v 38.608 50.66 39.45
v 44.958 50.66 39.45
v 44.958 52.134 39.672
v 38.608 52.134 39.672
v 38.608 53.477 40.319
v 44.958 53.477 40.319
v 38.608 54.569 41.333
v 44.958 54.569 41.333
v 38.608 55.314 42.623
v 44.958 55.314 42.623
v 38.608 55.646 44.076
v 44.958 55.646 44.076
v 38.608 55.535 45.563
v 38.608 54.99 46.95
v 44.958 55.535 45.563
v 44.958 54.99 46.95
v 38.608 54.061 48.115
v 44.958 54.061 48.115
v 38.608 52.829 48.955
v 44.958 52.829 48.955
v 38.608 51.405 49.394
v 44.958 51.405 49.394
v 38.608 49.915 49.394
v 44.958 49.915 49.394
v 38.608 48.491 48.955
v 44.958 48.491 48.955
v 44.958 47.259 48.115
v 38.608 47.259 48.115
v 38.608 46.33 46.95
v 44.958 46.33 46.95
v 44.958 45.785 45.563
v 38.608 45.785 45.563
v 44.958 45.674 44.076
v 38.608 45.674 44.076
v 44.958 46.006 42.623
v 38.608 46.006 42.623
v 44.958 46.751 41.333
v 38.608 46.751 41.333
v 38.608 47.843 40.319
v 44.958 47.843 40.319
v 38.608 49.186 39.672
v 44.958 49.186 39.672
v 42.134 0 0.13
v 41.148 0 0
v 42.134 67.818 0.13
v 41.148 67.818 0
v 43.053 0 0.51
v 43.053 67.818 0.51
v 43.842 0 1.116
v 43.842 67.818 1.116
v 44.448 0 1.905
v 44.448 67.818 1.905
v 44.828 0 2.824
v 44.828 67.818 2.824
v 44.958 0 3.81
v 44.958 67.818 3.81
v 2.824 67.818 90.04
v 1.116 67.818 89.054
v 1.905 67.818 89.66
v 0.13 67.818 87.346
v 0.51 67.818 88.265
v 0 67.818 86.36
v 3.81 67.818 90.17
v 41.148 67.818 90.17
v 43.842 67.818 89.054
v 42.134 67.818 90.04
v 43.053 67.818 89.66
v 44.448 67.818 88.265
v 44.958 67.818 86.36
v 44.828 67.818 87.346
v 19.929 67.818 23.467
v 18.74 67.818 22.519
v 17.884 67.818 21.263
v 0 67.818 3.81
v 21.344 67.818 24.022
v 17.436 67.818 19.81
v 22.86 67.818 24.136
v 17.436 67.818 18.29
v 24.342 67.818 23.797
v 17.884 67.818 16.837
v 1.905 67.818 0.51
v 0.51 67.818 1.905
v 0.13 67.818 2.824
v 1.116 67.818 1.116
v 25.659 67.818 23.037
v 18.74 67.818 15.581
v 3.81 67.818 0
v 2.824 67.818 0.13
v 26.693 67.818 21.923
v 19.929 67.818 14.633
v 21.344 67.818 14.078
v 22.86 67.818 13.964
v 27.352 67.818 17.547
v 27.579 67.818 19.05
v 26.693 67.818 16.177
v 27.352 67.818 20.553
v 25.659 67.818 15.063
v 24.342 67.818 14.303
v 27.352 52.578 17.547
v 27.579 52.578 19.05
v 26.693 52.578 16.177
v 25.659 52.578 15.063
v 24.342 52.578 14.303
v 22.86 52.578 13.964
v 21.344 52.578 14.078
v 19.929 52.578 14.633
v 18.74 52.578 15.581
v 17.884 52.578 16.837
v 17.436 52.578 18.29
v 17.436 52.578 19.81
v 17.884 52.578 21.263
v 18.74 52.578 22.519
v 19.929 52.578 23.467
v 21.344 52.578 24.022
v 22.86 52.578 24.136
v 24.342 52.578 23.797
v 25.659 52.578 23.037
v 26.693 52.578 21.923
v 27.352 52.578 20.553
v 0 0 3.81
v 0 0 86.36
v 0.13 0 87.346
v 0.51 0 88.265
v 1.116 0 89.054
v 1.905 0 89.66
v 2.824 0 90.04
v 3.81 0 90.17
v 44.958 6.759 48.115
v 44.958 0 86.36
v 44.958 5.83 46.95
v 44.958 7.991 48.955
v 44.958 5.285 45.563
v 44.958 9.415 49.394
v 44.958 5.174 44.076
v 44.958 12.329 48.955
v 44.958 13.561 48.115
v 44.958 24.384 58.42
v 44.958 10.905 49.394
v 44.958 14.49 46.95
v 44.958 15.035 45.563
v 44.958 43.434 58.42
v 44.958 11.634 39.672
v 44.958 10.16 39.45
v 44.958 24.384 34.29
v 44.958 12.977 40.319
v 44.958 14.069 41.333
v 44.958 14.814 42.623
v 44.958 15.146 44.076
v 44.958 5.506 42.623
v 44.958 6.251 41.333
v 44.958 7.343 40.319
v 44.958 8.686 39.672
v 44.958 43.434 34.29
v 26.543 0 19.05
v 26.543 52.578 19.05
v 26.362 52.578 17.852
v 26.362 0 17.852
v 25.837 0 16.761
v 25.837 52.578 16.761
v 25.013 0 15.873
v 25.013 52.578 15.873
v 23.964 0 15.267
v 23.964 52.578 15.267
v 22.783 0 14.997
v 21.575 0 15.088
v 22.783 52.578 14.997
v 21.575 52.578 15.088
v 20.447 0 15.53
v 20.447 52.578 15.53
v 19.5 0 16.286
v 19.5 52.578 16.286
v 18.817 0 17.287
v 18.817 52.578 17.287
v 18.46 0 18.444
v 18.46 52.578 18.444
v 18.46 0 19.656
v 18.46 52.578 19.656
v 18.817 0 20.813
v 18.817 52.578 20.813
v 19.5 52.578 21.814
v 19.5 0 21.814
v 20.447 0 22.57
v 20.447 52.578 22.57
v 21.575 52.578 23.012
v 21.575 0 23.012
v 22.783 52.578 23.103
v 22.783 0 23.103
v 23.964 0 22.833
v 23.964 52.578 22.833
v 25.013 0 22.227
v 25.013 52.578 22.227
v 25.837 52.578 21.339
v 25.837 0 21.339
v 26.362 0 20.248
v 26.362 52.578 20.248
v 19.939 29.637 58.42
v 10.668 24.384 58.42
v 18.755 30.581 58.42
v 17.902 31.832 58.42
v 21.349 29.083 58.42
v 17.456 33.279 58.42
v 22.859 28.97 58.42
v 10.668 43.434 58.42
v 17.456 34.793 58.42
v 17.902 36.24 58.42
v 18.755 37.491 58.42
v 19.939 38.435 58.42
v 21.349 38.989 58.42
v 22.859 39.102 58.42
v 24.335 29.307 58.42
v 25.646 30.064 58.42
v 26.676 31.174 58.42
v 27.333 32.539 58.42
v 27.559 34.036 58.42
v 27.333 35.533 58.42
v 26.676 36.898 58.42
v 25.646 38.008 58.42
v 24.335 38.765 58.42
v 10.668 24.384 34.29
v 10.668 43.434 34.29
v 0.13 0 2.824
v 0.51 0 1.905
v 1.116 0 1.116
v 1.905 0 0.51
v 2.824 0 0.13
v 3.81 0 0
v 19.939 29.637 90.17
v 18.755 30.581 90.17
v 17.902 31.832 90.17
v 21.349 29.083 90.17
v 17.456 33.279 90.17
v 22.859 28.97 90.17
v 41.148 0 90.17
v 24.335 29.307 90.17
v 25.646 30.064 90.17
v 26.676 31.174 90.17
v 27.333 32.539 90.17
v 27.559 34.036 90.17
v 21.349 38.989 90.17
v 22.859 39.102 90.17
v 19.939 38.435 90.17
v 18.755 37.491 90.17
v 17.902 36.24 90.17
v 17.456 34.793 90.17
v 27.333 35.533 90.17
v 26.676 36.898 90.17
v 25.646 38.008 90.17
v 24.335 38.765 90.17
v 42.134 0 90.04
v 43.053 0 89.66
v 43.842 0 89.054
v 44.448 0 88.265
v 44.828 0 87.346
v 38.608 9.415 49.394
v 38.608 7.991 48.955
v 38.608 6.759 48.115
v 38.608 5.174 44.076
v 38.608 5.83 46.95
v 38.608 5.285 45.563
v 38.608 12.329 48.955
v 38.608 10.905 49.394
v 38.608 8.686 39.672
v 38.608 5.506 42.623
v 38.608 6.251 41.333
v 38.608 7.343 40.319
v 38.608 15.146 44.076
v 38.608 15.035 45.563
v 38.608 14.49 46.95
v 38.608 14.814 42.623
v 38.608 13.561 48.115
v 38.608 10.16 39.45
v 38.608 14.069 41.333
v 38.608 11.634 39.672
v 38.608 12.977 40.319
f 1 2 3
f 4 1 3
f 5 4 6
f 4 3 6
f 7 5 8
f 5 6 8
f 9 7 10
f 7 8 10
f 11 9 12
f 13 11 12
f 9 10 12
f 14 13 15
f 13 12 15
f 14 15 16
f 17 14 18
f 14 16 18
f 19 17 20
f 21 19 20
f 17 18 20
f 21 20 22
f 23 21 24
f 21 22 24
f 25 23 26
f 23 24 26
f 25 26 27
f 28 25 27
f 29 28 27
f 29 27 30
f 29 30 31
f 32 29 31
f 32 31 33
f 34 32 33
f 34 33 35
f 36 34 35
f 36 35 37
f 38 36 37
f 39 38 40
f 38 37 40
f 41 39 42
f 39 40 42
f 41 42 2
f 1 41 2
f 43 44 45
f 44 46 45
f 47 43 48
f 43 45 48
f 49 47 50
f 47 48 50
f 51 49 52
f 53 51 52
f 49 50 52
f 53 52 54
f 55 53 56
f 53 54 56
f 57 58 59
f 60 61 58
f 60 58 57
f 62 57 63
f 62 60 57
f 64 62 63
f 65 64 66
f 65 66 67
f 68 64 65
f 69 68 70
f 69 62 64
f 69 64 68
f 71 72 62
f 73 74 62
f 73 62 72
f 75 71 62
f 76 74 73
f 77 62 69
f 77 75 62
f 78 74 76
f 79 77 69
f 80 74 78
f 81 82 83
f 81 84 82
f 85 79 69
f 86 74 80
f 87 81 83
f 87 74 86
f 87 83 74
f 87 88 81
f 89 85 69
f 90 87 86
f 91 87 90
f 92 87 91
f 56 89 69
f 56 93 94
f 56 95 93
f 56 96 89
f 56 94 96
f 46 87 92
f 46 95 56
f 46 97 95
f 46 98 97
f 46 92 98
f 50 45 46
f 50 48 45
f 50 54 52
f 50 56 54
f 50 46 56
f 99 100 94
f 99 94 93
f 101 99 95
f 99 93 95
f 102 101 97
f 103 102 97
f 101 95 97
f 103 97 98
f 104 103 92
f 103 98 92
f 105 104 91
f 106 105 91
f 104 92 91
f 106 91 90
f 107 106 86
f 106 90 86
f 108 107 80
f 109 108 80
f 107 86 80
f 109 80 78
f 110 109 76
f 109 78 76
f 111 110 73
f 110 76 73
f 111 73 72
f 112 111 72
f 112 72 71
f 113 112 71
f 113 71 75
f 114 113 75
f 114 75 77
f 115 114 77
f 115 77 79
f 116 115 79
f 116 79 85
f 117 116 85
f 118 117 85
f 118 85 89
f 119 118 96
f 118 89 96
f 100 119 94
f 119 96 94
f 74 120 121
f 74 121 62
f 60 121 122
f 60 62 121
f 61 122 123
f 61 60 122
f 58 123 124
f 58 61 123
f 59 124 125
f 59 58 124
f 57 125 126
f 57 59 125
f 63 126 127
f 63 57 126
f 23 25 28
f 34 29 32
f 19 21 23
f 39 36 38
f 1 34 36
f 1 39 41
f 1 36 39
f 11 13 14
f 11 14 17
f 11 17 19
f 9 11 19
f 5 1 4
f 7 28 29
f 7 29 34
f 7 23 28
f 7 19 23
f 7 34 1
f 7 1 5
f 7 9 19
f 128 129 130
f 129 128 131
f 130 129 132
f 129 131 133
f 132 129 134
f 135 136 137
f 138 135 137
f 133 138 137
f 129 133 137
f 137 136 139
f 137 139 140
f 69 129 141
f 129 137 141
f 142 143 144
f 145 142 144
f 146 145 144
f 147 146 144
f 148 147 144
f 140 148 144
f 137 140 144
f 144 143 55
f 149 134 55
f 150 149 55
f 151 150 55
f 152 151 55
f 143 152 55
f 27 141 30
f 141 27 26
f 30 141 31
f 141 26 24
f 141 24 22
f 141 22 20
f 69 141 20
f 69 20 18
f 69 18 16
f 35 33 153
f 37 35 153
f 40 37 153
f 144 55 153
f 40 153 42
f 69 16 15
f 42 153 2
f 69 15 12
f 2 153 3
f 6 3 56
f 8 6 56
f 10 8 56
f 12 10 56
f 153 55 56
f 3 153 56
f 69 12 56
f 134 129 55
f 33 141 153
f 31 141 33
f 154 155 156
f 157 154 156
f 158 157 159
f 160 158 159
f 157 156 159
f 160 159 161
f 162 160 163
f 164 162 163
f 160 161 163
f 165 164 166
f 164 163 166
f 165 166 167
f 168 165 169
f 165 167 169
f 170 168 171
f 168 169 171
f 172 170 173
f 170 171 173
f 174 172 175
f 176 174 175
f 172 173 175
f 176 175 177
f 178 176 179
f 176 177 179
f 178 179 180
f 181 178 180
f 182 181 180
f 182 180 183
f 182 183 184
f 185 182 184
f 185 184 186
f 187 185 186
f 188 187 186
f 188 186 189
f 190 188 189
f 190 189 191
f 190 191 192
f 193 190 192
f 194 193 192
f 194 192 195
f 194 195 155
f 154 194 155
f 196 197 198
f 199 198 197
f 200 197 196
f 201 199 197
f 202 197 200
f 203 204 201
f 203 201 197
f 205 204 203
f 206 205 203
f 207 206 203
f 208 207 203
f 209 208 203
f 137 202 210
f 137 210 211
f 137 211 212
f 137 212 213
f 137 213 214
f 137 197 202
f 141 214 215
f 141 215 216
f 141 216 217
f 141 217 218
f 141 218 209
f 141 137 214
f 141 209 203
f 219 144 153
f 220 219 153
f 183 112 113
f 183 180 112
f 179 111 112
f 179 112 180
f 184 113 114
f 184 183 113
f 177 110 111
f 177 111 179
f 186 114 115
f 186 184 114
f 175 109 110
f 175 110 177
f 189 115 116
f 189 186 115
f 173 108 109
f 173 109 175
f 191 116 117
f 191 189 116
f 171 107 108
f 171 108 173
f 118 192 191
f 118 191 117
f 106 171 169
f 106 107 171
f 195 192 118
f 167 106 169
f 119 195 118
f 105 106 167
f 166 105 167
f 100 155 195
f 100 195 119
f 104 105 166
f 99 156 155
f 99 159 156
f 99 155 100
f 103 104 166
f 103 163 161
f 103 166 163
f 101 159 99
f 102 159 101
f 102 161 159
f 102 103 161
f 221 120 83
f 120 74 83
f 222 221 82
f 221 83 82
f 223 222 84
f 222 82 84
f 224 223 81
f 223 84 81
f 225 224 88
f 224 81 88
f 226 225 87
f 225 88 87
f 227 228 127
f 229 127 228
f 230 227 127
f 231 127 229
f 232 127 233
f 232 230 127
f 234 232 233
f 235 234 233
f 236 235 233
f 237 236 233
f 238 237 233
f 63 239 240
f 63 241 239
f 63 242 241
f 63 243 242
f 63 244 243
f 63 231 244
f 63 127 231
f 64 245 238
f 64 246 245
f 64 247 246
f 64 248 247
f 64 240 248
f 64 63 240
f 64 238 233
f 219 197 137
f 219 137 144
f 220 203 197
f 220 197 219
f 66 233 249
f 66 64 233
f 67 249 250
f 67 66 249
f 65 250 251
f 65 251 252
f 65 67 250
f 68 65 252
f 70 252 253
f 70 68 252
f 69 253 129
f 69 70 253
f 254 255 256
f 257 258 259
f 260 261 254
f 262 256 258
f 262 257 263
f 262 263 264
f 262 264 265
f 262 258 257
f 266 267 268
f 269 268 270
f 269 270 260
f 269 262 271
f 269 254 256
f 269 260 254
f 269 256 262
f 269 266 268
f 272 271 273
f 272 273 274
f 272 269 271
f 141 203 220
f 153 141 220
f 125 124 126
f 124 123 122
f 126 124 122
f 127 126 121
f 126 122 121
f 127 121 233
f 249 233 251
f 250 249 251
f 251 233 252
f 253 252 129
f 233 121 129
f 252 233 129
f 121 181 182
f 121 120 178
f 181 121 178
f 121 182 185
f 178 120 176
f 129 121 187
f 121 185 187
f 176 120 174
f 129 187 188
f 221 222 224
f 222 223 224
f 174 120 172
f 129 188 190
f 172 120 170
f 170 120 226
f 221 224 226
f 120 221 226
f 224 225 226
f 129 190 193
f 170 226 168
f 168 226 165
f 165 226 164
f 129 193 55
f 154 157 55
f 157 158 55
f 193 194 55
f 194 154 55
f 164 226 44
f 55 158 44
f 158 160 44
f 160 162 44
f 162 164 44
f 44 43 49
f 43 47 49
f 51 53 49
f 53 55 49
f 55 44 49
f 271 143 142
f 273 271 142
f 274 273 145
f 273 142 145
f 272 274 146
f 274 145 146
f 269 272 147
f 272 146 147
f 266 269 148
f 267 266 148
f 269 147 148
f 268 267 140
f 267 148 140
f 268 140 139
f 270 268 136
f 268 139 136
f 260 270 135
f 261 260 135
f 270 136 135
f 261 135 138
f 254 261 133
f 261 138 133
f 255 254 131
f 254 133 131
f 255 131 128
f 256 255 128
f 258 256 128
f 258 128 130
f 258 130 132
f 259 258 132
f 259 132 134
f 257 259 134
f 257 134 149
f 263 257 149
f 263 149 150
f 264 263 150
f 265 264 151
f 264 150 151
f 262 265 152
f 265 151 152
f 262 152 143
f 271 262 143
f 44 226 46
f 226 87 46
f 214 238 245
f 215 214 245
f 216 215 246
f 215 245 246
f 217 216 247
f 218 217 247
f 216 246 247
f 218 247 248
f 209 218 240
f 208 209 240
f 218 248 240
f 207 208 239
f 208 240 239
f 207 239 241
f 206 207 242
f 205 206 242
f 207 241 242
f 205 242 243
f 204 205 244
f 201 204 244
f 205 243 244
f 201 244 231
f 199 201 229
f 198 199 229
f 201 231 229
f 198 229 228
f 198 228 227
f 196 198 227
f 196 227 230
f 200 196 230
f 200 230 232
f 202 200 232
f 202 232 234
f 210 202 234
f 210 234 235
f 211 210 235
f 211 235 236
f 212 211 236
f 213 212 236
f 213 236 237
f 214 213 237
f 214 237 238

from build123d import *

# Parameters (mm, degrees)
SKETCH1_W           = 44.958
SKETCH1_H           = 67.818
BOSS_EXTRUDE1_DEPTH = 90.17
SKETCH2_R           = 5
CUT_EXTRUDE1_DEPTH  = 6.35
SKETCH3_R           = 4.064
CUT_EXTRUDE2_DEPTH  = 68.818
SKETCH4_R           = 5.1
CUT_EXTRUDE3_DEPTH  = 15.24
SKETCH5_R           = 5.08
CUT_EXTRUDE4_DEPTH  = 50.8
SKETCH6_W           = 24.13
SKETCH6_H           = 19.05
CUT_EXTRUDE5_DEPTH  = 34.29
FILLET1_R           = 3.81


with BuildPart() as part:
    # Sketch1 → Boss-Extrude1 (new body)
    with BuildSketch(Plane.XY):
        with Locations((22.479, 33.909)):
            Rectangle(SKETCH1_W, SKETCH1_H)
    extrude(amount=BOSS_EXTRUDE1_DEPTH)

    # Sketch2 → Cut-Extrude1 (cut)
    with BuildSketch(Plane(origin=(44.958, 0, 0), x_dir=(0, 0, -1), z_dir=(1, 0, 0))):
        with Locations((-44.45, 50.66)):
            Circle(SKETCH2_R)
        with Locations((-44.45, 10.16)):
            Circle(SKETCH2_R)
    extrude(amount=-CUT_EXTRUDE1_DEPTH, mode=Mode.SUBTRACT)

    # Sketch3 → Cut-Extrude2 (cut, through all)
    with BuildSketch(Plane(origin=(0, 67.818, 0), x_dir=(1, 0, 0), z_dir=(0, 1, 0))):
        with Locations((22.479, -19.05)):
            Circle(SKETCH3_R)
    extrude(amount=-CUT_EXTRUDE2_DEPTH, mode=Mode.SUBTRACT)

    # Sketch4 → Cut-Extrude3 (cut)
    with BuildSketch(Plane(origin=(0, 67.818, 0), x_dir=(1, 0, 0), z_dir=(0, 1, 0))):
        with Locations((22.479, -19.05)):
            Circle(SKETCH4_R)
    extrude(amount=-CUT_EXTRUDE3_DEPTH, mode=Mode.SUBTRACT)

    # Sketch5 → Cut-Extrude4 (cut)
    with BuildSketch(Plane.XY.offset(90.17)):
        with Locations((22.479, 34.036)):
            Circle(SKETCH5_R)
    extrude(amount=-CUT_EXTRUDE4_DEPTH, mode=Mode.SUBTRACT)

    # Sketch6 → Cut-Extrude5 (cut)
    with BuildSketch(Plane(origin=(44.958, 0, 0), x_dir=(0, 0, -1), z_dir=(1, 0, 0))):
        with Locations((-46.355, 33.909)):
            Rectangle(SKETCH6_W, SKETCH6_H)
    extrude(amount=-CUT_EXTRUDE5_DEPTH, mode=Mode.SUBTRACT)

    # Fillet1
    fillet1_edges = [part.edges().sort_by_distance(p)[0] for p in [
        (44.958, 33.909, 90.17),
        (0, 33.909, 90.17),
        (44.958, 33.909, 0),
        (0, 33.909, 0),
    ]]
    fillet(fillet1_edges, radius=FILLET1_R)


solid = part.part
